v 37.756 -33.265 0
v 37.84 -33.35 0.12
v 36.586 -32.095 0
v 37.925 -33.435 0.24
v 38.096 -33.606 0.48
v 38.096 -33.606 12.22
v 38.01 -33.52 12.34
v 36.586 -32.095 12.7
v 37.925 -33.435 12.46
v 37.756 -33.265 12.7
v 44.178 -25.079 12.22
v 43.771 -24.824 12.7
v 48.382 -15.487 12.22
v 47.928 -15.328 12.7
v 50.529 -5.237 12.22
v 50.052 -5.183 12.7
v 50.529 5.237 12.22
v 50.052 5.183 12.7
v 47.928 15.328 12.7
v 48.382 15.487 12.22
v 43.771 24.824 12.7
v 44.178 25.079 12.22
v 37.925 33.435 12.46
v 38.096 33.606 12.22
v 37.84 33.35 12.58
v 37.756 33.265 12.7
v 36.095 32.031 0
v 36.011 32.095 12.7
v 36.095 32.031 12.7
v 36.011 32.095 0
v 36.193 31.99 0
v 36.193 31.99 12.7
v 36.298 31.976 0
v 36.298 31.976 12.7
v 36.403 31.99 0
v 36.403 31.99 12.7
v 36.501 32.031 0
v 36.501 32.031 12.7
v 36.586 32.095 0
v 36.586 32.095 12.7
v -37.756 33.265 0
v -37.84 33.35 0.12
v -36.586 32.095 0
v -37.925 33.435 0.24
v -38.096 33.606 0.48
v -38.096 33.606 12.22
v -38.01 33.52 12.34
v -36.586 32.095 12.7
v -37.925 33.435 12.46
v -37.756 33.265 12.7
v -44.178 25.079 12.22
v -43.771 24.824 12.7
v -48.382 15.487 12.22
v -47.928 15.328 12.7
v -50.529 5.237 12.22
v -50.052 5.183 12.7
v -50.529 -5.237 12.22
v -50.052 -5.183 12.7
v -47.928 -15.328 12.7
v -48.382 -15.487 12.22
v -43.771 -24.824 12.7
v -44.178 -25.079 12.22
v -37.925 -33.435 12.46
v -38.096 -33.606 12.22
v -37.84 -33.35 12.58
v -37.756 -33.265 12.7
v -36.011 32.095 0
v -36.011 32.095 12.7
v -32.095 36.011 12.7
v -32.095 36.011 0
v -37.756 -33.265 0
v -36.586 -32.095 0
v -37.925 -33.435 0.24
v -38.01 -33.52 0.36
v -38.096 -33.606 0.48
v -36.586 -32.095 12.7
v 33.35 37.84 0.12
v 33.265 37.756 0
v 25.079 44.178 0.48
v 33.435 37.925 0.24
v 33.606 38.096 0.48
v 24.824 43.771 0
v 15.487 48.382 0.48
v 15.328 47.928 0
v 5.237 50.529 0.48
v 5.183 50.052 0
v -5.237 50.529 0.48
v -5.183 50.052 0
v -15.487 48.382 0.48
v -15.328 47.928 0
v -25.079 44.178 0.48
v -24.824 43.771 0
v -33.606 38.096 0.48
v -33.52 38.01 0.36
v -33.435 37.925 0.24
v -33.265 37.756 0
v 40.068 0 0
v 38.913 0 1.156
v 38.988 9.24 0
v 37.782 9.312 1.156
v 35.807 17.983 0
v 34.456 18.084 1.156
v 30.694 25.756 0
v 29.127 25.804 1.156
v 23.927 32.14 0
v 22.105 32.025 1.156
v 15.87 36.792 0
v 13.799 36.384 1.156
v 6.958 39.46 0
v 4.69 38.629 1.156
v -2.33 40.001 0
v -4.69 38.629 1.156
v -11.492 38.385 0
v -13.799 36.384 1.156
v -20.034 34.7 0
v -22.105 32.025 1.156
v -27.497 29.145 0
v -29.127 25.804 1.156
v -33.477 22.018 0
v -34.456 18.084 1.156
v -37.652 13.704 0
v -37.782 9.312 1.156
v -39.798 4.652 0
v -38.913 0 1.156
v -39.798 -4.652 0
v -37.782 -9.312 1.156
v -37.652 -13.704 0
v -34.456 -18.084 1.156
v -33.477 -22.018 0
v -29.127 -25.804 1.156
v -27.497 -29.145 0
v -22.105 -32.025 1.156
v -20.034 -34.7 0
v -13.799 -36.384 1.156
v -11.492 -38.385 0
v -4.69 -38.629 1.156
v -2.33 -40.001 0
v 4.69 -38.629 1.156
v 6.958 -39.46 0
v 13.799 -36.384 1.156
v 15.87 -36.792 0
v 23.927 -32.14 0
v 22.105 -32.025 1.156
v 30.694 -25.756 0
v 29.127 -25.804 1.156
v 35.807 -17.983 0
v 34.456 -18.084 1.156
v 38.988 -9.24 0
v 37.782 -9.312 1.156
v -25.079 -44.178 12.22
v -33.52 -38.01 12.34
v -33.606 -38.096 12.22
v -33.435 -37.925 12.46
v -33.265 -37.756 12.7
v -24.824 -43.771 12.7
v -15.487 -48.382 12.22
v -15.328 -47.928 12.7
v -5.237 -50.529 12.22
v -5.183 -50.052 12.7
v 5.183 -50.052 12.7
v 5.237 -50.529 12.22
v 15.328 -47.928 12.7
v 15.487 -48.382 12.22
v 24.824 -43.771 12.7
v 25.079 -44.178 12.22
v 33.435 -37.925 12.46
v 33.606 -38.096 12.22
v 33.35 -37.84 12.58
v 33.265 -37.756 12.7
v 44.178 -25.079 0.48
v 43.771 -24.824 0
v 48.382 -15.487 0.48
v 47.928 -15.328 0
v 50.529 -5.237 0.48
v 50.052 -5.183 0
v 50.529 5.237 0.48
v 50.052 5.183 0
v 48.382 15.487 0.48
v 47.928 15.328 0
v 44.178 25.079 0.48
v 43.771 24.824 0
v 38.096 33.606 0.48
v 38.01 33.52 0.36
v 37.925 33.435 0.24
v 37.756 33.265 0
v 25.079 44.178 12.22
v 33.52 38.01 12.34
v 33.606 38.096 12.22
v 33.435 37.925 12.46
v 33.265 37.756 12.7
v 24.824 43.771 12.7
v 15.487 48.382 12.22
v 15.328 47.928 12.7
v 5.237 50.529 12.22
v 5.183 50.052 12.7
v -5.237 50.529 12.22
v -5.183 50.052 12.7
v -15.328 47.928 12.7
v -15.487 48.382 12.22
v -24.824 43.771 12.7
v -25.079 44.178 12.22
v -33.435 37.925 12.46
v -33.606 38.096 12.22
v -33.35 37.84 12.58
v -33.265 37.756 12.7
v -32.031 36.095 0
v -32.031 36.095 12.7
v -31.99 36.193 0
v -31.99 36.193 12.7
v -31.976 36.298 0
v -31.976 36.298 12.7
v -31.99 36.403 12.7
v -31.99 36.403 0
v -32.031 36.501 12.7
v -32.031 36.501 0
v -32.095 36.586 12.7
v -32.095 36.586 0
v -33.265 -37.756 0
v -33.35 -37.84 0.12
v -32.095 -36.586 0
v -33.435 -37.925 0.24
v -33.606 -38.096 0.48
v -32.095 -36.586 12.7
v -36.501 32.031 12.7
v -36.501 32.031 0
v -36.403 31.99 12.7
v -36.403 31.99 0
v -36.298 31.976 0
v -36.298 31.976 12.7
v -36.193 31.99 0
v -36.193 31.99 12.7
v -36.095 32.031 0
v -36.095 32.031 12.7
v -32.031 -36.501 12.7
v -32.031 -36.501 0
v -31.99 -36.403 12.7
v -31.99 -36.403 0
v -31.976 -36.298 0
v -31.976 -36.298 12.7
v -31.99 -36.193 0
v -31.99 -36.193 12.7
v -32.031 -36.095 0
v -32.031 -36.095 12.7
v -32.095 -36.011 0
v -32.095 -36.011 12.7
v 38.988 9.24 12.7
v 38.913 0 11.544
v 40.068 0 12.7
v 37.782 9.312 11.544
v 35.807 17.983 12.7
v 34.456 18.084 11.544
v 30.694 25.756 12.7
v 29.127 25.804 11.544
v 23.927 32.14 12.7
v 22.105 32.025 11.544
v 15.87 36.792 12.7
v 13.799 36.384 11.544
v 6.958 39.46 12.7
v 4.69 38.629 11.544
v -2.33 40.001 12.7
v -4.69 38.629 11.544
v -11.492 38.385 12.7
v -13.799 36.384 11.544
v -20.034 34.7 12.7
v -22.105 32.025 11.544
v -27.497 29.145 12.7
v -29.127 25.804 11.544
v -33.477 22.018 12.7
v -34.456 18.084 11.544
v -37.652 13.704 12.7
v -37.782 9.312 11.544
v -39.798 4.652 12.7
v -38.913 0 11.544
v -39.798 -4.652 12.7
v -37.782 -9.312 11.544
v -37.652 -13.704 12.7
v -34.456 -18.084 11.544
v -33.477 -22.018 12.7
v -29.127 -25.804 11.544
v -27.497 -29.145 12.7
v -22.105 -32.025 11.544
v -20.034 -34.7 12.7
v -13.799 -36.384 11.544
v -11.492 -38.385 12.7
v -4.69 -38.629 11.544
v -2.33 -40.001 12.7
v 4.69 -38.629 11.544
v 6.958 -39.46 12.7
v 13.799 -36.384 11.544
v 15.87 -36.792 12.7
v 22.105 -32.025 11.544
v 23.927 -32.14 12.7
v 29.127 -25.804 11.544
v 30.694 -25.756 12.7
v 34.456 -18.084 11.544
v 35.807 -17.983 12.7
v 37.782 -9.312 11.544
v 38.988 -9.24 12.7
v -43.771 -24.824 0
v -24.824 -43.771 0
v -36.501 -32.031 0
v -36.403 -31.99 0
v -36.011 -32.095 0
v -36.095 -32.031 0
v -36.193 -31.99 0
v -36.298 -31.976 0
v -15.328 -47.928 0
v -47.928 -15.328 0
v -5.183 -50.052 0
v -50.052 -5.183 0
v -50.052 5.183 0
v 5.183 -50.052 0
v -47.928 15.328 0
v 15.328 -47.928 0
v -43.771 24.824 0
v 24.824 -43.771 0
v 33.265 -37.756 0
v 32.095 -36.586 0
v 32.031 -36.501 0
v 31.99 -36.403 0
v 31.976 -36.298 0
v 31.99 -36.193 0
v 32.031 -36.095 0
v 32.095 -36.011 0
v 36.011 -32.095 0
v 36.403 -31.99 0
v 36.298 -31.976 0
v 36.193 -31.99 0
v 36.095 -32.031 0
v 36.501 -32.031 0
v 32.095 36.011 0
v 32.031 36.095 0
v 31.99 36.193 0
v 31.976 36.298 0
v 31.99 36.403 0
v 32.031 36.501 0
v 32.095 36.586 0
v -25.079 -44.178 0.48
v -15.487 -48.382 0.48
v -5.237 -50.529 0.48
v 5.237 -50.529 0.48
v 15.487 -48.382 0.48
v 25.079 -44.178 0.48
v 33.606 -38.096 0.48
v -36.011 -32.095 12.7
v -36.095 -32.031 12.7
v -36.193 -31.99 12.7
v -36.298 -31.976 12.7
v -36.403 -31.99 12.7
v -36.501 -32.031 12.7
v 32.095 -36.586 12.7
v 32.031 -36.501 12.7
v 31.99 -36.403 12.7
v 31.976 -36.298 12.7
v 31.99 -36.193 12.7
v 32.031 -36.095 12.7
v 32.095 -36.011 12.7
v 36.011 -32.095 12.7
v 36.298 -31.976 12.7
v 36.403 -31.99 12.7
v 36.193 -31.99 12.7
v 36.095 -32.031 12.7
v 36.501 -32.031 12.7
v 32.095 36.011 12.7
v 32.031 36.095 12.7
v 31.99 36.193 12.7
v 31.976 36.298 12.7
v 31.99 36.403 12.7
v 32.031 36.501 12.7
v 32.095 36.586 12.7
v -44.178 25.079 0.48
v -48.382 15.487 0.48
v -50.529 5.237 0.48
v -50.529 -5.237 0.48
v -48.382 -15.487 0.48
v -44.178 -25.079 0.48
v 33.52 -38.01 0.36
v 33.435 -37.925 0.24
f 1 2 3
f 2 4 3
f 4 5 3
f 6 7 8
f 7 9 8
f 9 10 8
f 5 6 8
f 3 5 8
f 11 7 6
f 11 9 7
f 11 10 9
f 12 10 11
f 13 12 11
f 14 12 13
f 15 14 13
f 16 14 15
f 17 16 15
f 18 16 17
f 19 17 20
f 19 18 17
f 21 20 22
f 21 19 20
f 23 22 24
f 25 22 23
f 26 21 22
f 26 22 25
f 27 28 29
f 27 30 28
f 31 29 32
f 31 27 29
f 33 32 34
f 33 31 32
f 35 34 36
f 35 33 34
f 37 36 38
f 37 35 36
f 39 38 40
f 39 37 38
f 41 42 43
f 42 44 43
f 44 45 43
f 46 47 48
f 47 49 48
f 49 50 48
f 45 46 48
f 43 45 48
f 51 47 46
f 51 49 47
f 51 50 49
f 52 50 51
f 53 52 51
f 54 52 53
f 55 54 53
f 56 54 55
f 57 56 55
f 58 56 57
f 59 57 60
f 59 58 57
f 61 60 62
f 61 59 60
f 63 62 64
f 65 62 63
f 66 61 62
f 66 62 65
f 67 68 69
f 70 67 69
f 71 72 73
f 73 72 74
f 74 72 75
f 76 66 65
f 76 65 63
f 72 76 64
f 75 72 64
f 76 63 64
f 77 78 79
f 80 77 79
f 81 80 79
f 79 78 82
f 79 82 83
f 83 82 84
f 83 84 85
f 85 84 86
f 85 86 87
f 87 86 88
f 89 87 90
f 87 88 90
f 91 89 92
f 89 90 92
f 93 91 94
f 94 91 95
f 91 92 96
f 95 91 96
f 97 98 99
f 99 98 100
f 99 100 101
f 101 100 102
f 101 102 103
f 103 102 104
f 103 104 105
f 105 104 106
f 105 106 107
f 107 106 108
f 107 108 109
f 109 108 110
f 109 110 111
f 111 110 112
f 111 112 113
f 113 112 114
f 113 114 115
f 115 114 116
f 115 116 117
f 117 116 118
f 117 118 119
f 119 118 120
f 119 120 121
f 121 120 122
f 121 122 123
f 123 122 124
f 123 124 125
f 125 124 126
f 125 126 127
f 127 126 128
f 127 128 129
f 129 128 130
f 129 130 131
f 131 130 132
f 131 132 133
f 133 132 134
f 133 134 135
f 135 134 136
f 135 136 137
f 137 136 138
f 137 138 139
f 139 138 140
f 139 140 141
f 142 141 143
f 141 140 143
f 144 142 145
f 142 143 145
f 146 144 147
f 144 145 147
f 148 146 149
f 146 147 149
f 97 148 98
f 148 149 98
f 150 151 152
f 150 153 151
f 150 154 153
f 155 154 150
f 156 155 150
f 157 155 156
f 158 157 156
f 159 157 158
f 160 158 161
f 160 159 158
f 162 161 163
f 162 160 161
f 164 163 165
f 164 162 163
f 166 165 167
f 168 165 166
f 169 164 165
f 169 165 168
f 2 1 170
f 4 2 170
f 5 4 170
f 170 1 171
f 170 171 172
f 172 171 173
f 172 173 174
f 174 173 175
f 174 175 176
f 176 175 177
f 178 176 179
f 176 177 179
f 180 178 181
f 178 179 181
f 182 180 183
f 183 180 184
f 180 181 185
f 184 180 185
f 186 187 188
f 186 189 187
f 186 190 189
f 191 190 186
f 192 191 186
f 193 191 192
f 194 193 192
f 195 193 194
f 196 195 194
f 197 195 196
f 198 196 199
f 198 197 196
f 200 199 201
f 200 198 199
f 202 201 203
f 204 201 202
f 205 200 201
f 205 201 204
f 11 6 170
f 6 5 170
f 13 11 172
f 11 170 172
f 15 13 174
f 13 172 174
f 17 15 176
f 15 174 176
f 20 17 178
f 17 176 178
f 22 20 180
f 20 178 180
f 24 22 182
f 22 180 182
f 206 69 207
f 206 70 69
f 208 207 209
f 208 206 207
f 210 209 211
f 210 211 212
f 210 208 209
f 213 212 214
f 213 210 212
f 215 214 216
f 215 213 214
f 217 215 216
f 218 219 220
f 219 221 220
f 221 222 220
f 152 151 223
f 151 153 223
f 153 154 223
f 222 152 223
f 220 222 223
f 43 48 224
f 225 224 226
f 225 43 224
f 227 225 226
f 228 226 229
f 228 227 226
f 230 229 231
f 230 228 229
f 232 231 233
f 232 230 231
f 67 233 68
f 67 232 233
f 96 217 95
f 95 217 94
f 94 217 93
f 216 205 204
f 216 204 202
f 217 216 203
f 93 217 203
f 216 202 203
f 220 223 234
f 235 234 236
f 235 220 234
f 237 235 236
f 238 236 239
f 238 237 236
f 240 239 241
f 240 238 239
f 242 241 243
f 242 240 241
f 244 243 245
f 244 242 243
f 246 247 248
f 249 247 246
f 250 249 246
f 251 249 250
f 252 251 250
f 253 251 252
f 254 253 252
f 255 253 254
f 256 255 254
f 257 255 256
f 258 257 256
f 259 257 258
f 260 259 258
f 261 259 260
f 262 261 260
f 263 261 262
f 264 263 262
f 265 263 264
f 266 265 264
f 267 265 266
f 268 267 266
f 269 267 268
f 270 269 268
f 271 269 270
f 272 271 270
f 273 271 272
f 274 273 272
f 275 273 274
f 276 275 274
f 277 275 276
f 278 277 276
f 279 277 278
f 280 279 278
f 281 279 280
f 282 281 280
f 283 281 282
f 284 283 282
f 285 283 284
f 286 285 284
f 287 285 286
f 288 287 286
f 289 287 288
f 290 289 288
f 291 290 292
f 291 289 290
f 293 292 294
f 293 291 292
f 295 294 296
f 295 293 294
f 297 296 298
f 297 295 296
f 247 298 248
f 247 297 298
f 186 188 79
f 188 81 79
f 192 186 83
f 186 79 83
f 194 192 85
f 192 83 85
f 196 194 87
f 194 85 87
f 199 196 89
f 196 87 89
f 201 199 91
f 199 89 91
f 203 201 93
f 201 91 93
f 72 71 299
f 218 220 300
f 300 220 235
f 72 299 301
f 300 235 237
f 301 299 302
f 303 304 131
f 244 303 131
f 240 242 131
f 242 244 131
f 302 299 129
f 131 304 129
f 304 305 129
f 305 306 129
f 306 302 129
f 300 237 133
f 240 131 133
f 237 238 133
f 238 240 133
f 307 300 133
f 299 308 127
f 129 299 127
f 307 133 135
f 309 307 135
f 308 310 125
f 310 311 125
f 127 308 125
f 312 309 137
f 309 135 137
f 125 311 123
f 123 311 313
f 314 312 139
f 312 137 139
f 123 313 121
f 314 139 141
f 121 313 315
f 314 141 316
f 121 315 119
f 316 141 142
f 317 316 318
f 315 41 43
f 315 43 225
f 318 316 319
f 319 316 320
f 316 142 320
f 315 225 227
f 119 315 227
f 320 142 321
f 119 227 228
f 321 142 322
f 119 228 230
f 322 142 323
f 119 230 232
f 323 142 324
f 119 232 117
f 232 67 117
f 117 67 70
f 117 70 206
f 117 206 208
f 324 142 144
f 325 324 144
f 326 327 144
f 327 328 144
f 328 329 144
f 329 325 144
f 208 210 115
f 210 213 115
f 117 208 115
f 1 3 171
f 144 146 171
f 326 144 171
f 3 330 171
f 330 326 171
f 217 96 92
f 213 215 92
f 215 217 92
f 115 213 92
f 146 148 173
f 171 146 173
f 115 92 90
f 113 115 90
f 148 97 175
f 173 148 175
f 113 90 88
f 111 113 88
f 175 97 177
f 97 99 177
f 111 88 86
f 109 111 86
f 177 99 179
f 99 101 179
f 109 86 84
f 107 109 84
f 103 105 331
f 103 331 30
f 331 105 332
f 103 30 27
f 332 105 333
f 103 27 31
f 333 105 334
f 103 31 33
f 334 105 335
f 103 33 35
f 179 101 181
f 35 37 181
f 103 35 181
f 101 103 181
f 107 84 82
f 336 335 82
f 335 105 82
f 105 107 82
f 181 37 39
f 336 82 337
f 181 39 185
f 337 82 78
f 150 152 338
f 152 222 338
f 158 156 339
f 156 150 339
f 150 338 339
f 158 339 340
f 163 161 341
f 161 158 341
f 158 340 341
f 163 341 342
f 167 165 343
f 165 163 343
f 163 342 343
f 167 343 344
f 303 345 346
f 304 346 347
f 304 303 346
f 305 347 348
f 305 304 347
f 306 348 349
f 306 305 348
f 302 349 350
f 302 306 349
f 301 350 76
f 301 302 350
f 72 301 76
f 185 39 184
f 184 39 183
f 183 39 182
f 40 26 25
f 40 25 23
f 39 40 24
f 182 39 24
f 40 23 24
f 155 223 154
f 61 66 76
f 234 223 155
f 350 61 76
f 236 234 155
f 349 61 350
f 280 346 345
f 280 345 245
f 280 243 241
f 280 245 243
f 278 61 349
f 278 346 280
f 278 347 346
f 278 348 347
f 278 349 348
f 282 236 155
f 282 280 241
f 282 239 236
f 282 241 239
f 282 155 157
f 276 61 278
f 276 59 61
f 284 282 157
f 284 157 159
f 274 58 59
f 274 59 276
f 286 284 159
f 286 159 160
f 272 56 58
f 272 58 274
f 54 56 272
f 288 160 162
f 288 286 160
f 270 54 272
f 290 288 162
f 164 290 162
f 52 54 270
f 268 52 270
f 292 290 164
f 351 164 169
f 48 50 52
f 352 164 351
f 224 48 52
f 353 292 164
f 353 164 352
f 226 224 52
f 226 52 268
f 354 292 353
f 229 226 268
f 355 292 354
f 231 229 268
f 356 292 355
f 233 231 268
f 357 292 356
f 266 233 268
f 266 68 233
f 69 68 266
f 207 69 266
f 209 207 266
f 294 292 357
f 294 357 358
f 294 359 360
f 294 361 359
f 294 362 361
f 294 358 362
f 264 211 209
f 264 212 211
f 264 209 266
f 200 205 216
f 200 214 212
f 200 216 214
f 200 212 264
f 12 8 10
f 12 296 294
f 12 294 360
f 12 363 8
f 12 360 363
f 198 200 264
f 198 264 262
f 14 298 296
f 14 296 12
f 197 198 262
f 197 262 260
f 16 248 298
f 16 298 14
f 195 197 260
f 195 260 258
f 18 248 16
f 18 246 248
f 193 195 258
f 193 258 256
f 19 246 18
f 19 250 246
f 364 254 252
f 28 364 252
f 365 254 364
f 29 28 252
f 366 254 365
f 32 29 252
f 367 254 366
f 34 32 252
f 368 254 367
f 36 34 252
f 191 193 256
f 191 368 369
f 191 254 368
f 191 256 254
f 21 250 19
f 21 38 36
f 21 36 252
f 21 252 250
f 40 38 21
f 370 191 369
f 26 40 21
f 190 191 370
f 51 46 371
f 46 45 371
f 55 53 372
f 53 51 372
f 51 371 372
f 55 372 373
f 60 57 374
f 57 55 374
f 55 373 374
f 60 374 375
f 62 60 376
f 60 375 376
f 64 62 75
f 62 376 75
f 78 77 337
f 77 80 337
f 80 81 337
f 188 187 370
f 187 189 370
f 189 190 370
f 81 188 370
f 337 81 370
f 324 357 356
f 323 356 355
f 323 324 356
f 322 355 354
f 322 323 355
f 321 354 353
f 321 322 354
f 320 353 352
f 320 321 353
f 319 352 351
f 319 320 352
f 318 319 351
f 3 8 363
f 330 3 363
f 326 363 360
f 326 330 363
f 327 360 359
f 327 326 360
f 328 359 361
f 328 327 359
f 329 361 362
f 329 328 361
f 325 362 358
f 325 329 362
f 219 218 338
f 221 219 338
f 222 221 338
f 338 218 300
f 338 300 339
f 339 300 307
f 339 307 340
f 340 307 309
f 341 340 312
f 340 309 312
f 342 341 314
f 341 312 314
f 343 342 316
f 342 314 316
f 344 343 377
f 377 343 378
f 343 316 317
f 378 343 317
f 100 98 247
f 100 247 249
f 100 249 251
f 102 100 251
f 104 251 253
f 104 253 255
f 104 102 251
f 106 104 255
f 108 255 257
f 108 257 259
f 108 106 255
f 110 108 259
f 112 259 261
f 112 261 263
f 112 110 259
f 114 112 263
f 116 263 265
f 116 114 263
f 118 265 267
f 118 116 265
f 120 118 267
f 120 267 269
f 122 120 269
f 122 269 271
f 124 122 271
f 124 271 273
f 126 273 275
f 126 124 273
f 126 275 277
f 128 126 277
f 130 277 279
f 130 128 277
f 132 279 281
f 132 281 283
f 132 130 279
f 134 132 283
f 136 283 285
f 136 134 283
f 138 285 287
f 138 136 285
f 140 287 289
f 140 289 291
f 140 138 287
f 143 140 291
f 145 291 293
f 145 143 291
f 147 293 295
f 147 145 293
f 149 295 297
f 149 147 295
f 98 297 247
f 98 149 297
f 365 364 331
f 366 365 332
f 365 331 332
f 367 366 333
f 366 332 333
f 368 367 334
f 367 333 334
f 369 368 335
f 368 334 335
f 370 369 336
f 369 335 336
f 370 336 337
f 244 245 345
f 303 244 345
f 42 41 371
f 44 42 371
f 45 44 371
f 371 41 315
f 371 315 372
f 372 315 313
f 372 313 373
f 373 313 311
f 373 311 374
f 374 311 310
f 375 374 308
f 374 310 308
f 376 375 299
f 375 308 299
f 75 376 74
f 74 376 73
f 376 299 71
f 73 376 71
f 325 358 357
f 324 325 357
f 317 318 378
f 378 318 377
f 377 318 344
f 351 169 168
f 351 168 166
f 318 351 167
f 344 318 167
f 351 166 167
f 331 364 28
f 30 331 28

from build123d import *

# Parameters (mm, degrees)
SKETCH1_R                = 50.8
SKETCH1_R_2              = 38.9128
EXTRUDE1_DEPTH           = 12.7
CHAMFER1_SIZE            = 0.480314
CHAMFER2_SIZE            = 1.1557
CUT_EXTRUDE1_DEPTH       = 13.7
FILLET1_R                = 0.4064
CIRPATTERN1_COUNT        = 4
FILLET1_OF_CIRPATTERN1_R = 0.4064


with BuildPart() as part:
    # Sketch1 → Extrude1 (new body)
    with BuildSketch(Plane.XY):
        Circle(SKETCH1_R)
        Circle(SKETCH1_R_2, mode=Mode.SUBTRACT)
    extrude(amount=EXTRUDE1_DEPTH)

    # Chamfer1
    chamfer1_edges = [part.edges().sort_by_distance(p)[0] for p in [
        (-50.8, 0, 0),
        (-50.8, 0, 12.7),
    ]]
    chamfer(chamfer1_edges, length=CHAMFER1_SIZE)

    # Chamfer2
    chamfer2_edges = [part.edges().sort_by_distance(p)[0] for p in [
        (-38.9128, 0, 0),
        (-38.9128, 0, 12.7),
    ]]
    chamfer(chamfer2_edges, length=CHAMFER2_SIZE)

    # Sketch2 → Cut-Extrude1 (cut, through all)
    with BuildSketch(Plane.XY.offset(12.7)):
        with BuildLine():
            Line((33.605733555, 38.095861616), (31.808067181, 36.298195241))
            Line((31.808067181, 36.298195241), (36.298195241, 31.808067181))
            Line((36.298195241, 31.808067181), (38.095861616, 33.605733555))
            ThreePointArc((38.095861616, 33.605733555), (35.921024484, 35.921024484), (33.605733555, 38.095861616))
        make_face()
    cut_extrude1 = extrude(amount=-CUT_EXTRUDE1_DEPTH, mode=Mode.SUBTRACT)

    # Fillet1
    fillet1_edges = [part.edges().sort_by_distance(p)[0] for p in [
        (36.298195241, 31.808067181, 6.35),
        (31.808067181, 36.298195241, 6.35),
    ]]
    fillet(fillet1_edges, radius=FILLET1_R)

    # CirPattern1: Cut-Extrude1 ×4 about axis
    cirpattern1_axis = Axis((0, 0, 0), (0, 0, 1))
    for i in range(1, CIRPATTERN1_COUNT):
        add(cut_extrude1.rotate(cirpattern1_axis, i * 360 / CIRPATTERN1_COUNT), mode=Mode.SUBTRACT)

    # Fillet1 of CirPattern1
    fillet1_of_cirpattern1_edges = [part.edges().sort_by_distance(p)[0] for p in [
        (-31.808067181, 36.298195241, 6.35),
        (-36.298195241, 31.808067181, 6.35),
        (-36.298195241, -31.808067181, 6.35),
        (-31.808067181, -36.298195241, 6.35),
        (31.808067181, -36.298195241, 6.35),
        (36.298195241, -31.808067181, 6.35),
    ]]
    fillet(fillet1_of_cirpattern1_edges, radius=FILLET1_OF_CIRPATTERN1_R)


solid = part.part
